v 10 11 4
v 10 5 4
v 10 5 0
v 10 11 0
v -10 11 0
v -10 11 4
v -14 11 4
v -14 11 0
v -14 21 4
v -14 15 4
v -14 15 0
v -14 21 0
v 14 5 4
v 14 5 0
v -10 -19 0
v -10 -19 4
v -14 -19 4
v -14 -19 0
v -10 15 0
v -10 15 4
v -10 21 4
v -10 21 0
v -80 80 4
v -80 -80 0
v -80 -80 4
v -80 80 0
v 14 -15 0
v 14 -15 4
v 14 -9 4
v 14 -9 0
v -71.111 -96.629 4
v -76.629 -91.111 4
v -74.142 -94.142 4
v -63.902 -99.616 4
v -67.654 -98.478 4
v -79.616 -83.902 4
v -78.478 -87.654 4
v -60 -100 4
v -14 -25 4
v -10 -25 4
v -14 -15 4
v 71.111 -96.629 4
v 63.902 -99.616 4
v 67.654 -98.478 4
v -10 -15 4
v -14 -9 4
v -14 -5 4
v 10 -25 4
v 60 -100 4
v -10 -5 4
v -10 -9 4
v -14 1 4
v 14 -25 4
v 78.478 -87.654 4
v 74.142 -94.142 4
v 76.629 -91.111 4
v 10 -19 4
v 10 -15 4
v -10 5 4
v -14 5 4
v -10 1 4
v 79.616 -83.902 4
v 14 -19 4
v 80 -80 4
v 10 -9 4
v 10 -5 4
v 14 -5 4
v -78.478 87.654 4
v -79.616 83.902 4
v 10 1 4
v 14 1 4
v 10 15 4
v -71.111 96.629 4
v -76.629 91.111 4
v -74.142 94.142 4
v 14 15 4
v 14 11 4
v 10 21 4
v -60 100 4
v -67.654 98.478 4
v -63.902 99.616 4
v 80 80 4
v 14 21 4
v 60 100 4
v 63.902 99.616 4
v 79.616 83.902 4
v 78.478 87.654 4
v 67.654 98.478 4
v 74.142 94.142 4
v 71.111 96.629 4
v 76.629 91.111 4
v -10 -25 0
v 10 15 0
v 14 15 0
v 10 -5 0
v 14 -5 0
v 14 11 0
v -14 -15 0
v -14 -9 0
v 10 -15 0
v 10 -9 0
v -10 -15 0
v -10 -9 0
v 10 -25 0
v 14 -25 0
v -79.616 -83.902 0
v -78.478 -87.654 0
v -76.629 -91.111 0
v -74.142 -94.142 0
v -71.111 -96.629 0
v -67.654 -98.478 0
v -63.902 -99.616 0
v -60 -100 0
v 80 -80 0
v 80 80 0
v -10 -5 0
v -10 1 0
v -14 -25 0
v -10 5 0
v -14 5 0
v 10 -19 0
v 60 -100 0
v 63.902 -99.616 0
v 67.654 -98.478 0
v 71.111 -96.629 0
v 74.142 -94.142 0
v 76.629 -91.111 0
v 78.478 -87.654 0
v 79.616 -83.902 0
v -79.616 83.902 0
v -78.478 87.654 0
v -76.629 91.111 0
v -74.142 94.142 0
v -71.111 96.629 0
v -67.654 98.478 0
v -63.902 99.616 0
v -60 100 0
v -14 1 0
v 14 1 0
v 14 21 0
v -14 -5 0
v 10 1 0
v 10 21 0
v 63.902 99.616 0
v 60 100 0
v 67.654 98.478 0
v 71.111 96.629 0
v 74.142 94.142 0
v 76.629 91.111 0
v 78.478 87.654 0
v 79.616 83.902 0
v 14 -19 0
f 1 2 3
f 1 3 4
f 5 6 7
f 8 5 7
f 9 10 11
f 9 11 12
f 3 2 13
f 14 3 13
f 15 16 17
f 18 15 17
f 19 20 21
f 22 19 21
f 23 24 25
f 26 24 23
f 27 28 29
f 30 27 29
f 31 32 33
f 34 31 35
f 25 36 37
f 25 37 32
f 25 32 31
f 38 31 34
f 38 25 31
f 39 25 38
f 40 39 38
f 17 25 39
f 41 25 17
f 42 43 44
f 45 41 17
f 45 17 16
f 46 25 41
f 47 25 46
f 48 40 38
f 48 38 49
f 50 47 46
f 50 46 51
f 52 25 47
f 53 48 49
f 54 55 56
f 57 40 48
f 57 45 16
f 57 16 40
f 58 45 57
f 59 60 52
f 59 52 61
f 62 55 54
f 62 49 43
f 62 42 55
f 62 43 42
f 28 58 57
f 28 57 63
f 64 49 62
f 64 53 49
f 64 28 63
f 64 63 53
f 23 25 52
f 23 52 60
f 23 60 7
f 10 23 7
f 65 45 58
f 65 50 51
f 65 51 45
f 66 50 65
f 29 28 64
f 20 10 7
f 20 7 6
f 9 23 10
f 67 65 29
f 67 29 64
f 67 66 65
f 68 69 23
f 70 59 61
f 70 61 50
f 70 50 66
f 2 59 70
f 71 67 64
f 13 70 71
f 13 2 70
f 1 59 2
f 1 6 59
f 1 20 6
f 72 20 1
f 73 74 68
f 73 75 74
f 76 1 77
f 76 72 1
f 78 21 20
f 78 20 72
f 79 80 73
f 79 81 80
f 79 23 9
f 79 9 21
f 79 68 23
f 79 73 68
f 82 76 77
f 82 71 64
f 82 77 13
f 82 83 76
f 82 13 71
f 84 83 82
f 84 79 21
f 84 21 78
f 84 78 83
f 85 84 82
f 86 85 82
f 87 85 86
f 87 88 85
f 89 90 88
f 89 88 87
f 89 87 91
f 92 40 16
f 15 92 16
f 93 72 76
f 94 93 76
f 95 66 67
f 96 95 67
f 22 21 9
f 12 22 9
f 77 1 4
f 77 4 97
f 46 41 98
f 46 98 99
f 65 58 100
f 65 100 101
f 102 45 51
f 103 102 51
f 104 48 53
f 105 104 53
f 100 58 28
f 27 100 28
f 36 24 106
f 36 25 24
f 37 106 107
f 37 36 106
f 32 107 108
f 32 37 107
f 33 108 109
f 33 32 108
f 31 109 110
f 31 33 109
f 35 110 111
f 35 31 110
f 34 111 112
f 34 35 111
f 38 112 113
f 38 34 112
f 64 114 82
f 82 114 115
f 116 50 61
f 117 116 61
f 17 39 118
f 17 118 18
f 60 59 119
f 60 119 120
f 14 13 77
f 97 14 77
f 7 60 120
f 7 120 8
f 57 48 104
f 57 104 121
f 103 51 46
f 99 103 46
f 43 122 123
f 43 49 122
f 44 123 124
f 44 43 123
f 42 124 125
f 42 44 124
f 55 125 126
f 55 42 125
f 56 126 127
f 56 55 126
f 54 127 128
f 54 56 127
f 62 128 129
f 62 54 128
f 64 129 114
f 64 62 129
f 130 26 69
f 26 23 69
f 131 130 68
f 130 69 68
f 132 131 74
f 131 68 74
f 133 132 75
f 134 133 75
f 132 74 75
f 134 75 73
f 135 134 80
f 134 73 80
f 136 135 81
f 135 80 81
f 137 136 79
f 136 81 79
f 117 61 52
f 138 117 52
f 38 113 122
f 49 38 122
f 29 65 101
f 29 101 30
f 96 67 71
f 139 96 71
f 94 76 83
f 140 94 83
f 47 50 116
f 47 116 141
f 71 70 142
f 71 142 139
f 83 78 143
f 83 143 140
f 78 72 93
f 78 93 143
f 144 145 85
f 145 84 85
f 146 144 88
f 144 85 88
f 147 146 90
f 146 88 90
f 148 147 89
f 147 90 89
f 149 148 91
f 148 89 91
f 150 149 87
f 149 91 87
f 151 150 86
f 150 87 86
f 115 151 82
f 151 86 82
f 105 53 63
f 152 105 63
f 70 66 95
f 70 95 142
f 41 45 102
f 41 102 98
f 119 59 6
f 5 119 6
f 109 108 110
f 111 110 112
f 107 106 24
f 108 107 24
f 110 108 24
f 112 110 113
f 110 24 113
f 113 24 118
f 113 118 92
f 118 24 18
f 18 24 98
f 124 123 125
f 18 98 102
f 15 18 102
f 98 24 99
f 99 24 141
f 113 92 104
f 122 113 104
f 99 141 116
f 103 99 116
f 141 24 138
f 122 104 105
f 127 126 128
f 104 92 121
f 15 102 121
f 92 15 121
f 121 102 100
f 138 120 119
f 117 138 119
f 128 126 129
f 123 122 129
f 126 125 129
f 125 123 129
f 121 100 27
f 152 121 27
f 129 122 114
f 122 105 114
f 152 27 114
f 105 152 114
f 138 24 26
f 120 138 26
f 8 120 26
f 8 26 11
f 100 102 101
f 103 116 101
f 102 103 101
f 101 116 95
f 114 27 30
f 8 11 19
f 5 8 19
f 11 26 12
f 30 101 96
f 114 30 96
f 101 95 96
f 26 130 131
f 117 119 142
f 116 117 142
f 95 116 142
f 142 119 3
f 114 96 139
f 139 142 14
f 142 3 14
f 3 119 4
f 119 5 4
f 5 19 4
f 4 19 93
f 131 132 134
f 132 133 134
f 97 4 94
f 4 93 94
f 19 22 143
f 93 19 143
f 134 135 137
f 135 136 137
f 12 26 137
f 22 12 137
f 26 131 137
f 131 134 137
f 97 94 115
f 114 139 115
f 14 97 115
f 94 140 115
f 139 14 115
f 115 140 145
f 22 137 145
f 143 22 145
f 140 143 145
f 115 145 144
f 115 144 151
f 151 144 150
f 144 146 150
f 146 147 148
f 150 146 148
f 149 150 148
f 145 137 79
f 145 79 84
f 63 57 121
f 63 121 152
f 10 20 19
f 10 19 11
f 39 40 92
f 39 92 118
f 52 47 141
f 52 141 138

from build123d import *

# Parameters (mm, degrees)
SKETCH1_W           = 160
SKETCH1_H           = 200
BOSS_EXTRUDE1_DEPTH = 4
SKETCH2_W           = 4
SKETCH2_H           = 6
CUT_EXTRUDE1_DEPTH  = 4
FILLET1_R           = 20


with BuildPart() as part:
    # Sketch1 → Boss-Extrude1 (new body)
    with BuildSketch(Plane.XY):
        Rectangle(SKETCH1_W, SKETCH1_H)
    extrude(amount=BOSS_EXTRUDE1_DEPTH)

    # Sketch2 → Cut-Extrude1 (cut)
    with BuildSketch(Plane.XY.offset(4)):
        with Locations((12, 18)):
            Rectangle(SKETCH2_W, SKETCH2_H)
        with Locations((12, 8)):
            Rectangle(SKETCH2_W, SKETCH2_H)
        with Locations((12, -2)):
            Rectangle(SKETCH2_W, SKETCH2_H)
        with Locations((12, -12)):
            Rectangle(SKETCH2_W, SKETCH2_H)
        with Locations((12, -22)):
            Rectangle(SKETCH2_W, SKETCH2_H)
    cut_extrude1 = extrude(amount=-CUT_EXTRUDE1_DEPTH, mode=Mode.SUBTRACT)

    # Mirror1: Cut-Extrude1 across plane
    add(cut_extrude1.mirror(Plane(origin=(0, 0, 0), x_dir=(0, 0, 1), z_dir=(1, 0, 0))), mode=Mode.SUBTRACT)

    # Fillet1
    fillet1_edges = [part.edges().sort_by_distance(p)[0] for p in [
        (80, -100, 2),
        (-80, -100, 2),
        (-80, 100, 2),
        (80, 100, 2),
    ]]
    fillet(fillet1_edges, radius=FILLET1_R)


solid = part.part
